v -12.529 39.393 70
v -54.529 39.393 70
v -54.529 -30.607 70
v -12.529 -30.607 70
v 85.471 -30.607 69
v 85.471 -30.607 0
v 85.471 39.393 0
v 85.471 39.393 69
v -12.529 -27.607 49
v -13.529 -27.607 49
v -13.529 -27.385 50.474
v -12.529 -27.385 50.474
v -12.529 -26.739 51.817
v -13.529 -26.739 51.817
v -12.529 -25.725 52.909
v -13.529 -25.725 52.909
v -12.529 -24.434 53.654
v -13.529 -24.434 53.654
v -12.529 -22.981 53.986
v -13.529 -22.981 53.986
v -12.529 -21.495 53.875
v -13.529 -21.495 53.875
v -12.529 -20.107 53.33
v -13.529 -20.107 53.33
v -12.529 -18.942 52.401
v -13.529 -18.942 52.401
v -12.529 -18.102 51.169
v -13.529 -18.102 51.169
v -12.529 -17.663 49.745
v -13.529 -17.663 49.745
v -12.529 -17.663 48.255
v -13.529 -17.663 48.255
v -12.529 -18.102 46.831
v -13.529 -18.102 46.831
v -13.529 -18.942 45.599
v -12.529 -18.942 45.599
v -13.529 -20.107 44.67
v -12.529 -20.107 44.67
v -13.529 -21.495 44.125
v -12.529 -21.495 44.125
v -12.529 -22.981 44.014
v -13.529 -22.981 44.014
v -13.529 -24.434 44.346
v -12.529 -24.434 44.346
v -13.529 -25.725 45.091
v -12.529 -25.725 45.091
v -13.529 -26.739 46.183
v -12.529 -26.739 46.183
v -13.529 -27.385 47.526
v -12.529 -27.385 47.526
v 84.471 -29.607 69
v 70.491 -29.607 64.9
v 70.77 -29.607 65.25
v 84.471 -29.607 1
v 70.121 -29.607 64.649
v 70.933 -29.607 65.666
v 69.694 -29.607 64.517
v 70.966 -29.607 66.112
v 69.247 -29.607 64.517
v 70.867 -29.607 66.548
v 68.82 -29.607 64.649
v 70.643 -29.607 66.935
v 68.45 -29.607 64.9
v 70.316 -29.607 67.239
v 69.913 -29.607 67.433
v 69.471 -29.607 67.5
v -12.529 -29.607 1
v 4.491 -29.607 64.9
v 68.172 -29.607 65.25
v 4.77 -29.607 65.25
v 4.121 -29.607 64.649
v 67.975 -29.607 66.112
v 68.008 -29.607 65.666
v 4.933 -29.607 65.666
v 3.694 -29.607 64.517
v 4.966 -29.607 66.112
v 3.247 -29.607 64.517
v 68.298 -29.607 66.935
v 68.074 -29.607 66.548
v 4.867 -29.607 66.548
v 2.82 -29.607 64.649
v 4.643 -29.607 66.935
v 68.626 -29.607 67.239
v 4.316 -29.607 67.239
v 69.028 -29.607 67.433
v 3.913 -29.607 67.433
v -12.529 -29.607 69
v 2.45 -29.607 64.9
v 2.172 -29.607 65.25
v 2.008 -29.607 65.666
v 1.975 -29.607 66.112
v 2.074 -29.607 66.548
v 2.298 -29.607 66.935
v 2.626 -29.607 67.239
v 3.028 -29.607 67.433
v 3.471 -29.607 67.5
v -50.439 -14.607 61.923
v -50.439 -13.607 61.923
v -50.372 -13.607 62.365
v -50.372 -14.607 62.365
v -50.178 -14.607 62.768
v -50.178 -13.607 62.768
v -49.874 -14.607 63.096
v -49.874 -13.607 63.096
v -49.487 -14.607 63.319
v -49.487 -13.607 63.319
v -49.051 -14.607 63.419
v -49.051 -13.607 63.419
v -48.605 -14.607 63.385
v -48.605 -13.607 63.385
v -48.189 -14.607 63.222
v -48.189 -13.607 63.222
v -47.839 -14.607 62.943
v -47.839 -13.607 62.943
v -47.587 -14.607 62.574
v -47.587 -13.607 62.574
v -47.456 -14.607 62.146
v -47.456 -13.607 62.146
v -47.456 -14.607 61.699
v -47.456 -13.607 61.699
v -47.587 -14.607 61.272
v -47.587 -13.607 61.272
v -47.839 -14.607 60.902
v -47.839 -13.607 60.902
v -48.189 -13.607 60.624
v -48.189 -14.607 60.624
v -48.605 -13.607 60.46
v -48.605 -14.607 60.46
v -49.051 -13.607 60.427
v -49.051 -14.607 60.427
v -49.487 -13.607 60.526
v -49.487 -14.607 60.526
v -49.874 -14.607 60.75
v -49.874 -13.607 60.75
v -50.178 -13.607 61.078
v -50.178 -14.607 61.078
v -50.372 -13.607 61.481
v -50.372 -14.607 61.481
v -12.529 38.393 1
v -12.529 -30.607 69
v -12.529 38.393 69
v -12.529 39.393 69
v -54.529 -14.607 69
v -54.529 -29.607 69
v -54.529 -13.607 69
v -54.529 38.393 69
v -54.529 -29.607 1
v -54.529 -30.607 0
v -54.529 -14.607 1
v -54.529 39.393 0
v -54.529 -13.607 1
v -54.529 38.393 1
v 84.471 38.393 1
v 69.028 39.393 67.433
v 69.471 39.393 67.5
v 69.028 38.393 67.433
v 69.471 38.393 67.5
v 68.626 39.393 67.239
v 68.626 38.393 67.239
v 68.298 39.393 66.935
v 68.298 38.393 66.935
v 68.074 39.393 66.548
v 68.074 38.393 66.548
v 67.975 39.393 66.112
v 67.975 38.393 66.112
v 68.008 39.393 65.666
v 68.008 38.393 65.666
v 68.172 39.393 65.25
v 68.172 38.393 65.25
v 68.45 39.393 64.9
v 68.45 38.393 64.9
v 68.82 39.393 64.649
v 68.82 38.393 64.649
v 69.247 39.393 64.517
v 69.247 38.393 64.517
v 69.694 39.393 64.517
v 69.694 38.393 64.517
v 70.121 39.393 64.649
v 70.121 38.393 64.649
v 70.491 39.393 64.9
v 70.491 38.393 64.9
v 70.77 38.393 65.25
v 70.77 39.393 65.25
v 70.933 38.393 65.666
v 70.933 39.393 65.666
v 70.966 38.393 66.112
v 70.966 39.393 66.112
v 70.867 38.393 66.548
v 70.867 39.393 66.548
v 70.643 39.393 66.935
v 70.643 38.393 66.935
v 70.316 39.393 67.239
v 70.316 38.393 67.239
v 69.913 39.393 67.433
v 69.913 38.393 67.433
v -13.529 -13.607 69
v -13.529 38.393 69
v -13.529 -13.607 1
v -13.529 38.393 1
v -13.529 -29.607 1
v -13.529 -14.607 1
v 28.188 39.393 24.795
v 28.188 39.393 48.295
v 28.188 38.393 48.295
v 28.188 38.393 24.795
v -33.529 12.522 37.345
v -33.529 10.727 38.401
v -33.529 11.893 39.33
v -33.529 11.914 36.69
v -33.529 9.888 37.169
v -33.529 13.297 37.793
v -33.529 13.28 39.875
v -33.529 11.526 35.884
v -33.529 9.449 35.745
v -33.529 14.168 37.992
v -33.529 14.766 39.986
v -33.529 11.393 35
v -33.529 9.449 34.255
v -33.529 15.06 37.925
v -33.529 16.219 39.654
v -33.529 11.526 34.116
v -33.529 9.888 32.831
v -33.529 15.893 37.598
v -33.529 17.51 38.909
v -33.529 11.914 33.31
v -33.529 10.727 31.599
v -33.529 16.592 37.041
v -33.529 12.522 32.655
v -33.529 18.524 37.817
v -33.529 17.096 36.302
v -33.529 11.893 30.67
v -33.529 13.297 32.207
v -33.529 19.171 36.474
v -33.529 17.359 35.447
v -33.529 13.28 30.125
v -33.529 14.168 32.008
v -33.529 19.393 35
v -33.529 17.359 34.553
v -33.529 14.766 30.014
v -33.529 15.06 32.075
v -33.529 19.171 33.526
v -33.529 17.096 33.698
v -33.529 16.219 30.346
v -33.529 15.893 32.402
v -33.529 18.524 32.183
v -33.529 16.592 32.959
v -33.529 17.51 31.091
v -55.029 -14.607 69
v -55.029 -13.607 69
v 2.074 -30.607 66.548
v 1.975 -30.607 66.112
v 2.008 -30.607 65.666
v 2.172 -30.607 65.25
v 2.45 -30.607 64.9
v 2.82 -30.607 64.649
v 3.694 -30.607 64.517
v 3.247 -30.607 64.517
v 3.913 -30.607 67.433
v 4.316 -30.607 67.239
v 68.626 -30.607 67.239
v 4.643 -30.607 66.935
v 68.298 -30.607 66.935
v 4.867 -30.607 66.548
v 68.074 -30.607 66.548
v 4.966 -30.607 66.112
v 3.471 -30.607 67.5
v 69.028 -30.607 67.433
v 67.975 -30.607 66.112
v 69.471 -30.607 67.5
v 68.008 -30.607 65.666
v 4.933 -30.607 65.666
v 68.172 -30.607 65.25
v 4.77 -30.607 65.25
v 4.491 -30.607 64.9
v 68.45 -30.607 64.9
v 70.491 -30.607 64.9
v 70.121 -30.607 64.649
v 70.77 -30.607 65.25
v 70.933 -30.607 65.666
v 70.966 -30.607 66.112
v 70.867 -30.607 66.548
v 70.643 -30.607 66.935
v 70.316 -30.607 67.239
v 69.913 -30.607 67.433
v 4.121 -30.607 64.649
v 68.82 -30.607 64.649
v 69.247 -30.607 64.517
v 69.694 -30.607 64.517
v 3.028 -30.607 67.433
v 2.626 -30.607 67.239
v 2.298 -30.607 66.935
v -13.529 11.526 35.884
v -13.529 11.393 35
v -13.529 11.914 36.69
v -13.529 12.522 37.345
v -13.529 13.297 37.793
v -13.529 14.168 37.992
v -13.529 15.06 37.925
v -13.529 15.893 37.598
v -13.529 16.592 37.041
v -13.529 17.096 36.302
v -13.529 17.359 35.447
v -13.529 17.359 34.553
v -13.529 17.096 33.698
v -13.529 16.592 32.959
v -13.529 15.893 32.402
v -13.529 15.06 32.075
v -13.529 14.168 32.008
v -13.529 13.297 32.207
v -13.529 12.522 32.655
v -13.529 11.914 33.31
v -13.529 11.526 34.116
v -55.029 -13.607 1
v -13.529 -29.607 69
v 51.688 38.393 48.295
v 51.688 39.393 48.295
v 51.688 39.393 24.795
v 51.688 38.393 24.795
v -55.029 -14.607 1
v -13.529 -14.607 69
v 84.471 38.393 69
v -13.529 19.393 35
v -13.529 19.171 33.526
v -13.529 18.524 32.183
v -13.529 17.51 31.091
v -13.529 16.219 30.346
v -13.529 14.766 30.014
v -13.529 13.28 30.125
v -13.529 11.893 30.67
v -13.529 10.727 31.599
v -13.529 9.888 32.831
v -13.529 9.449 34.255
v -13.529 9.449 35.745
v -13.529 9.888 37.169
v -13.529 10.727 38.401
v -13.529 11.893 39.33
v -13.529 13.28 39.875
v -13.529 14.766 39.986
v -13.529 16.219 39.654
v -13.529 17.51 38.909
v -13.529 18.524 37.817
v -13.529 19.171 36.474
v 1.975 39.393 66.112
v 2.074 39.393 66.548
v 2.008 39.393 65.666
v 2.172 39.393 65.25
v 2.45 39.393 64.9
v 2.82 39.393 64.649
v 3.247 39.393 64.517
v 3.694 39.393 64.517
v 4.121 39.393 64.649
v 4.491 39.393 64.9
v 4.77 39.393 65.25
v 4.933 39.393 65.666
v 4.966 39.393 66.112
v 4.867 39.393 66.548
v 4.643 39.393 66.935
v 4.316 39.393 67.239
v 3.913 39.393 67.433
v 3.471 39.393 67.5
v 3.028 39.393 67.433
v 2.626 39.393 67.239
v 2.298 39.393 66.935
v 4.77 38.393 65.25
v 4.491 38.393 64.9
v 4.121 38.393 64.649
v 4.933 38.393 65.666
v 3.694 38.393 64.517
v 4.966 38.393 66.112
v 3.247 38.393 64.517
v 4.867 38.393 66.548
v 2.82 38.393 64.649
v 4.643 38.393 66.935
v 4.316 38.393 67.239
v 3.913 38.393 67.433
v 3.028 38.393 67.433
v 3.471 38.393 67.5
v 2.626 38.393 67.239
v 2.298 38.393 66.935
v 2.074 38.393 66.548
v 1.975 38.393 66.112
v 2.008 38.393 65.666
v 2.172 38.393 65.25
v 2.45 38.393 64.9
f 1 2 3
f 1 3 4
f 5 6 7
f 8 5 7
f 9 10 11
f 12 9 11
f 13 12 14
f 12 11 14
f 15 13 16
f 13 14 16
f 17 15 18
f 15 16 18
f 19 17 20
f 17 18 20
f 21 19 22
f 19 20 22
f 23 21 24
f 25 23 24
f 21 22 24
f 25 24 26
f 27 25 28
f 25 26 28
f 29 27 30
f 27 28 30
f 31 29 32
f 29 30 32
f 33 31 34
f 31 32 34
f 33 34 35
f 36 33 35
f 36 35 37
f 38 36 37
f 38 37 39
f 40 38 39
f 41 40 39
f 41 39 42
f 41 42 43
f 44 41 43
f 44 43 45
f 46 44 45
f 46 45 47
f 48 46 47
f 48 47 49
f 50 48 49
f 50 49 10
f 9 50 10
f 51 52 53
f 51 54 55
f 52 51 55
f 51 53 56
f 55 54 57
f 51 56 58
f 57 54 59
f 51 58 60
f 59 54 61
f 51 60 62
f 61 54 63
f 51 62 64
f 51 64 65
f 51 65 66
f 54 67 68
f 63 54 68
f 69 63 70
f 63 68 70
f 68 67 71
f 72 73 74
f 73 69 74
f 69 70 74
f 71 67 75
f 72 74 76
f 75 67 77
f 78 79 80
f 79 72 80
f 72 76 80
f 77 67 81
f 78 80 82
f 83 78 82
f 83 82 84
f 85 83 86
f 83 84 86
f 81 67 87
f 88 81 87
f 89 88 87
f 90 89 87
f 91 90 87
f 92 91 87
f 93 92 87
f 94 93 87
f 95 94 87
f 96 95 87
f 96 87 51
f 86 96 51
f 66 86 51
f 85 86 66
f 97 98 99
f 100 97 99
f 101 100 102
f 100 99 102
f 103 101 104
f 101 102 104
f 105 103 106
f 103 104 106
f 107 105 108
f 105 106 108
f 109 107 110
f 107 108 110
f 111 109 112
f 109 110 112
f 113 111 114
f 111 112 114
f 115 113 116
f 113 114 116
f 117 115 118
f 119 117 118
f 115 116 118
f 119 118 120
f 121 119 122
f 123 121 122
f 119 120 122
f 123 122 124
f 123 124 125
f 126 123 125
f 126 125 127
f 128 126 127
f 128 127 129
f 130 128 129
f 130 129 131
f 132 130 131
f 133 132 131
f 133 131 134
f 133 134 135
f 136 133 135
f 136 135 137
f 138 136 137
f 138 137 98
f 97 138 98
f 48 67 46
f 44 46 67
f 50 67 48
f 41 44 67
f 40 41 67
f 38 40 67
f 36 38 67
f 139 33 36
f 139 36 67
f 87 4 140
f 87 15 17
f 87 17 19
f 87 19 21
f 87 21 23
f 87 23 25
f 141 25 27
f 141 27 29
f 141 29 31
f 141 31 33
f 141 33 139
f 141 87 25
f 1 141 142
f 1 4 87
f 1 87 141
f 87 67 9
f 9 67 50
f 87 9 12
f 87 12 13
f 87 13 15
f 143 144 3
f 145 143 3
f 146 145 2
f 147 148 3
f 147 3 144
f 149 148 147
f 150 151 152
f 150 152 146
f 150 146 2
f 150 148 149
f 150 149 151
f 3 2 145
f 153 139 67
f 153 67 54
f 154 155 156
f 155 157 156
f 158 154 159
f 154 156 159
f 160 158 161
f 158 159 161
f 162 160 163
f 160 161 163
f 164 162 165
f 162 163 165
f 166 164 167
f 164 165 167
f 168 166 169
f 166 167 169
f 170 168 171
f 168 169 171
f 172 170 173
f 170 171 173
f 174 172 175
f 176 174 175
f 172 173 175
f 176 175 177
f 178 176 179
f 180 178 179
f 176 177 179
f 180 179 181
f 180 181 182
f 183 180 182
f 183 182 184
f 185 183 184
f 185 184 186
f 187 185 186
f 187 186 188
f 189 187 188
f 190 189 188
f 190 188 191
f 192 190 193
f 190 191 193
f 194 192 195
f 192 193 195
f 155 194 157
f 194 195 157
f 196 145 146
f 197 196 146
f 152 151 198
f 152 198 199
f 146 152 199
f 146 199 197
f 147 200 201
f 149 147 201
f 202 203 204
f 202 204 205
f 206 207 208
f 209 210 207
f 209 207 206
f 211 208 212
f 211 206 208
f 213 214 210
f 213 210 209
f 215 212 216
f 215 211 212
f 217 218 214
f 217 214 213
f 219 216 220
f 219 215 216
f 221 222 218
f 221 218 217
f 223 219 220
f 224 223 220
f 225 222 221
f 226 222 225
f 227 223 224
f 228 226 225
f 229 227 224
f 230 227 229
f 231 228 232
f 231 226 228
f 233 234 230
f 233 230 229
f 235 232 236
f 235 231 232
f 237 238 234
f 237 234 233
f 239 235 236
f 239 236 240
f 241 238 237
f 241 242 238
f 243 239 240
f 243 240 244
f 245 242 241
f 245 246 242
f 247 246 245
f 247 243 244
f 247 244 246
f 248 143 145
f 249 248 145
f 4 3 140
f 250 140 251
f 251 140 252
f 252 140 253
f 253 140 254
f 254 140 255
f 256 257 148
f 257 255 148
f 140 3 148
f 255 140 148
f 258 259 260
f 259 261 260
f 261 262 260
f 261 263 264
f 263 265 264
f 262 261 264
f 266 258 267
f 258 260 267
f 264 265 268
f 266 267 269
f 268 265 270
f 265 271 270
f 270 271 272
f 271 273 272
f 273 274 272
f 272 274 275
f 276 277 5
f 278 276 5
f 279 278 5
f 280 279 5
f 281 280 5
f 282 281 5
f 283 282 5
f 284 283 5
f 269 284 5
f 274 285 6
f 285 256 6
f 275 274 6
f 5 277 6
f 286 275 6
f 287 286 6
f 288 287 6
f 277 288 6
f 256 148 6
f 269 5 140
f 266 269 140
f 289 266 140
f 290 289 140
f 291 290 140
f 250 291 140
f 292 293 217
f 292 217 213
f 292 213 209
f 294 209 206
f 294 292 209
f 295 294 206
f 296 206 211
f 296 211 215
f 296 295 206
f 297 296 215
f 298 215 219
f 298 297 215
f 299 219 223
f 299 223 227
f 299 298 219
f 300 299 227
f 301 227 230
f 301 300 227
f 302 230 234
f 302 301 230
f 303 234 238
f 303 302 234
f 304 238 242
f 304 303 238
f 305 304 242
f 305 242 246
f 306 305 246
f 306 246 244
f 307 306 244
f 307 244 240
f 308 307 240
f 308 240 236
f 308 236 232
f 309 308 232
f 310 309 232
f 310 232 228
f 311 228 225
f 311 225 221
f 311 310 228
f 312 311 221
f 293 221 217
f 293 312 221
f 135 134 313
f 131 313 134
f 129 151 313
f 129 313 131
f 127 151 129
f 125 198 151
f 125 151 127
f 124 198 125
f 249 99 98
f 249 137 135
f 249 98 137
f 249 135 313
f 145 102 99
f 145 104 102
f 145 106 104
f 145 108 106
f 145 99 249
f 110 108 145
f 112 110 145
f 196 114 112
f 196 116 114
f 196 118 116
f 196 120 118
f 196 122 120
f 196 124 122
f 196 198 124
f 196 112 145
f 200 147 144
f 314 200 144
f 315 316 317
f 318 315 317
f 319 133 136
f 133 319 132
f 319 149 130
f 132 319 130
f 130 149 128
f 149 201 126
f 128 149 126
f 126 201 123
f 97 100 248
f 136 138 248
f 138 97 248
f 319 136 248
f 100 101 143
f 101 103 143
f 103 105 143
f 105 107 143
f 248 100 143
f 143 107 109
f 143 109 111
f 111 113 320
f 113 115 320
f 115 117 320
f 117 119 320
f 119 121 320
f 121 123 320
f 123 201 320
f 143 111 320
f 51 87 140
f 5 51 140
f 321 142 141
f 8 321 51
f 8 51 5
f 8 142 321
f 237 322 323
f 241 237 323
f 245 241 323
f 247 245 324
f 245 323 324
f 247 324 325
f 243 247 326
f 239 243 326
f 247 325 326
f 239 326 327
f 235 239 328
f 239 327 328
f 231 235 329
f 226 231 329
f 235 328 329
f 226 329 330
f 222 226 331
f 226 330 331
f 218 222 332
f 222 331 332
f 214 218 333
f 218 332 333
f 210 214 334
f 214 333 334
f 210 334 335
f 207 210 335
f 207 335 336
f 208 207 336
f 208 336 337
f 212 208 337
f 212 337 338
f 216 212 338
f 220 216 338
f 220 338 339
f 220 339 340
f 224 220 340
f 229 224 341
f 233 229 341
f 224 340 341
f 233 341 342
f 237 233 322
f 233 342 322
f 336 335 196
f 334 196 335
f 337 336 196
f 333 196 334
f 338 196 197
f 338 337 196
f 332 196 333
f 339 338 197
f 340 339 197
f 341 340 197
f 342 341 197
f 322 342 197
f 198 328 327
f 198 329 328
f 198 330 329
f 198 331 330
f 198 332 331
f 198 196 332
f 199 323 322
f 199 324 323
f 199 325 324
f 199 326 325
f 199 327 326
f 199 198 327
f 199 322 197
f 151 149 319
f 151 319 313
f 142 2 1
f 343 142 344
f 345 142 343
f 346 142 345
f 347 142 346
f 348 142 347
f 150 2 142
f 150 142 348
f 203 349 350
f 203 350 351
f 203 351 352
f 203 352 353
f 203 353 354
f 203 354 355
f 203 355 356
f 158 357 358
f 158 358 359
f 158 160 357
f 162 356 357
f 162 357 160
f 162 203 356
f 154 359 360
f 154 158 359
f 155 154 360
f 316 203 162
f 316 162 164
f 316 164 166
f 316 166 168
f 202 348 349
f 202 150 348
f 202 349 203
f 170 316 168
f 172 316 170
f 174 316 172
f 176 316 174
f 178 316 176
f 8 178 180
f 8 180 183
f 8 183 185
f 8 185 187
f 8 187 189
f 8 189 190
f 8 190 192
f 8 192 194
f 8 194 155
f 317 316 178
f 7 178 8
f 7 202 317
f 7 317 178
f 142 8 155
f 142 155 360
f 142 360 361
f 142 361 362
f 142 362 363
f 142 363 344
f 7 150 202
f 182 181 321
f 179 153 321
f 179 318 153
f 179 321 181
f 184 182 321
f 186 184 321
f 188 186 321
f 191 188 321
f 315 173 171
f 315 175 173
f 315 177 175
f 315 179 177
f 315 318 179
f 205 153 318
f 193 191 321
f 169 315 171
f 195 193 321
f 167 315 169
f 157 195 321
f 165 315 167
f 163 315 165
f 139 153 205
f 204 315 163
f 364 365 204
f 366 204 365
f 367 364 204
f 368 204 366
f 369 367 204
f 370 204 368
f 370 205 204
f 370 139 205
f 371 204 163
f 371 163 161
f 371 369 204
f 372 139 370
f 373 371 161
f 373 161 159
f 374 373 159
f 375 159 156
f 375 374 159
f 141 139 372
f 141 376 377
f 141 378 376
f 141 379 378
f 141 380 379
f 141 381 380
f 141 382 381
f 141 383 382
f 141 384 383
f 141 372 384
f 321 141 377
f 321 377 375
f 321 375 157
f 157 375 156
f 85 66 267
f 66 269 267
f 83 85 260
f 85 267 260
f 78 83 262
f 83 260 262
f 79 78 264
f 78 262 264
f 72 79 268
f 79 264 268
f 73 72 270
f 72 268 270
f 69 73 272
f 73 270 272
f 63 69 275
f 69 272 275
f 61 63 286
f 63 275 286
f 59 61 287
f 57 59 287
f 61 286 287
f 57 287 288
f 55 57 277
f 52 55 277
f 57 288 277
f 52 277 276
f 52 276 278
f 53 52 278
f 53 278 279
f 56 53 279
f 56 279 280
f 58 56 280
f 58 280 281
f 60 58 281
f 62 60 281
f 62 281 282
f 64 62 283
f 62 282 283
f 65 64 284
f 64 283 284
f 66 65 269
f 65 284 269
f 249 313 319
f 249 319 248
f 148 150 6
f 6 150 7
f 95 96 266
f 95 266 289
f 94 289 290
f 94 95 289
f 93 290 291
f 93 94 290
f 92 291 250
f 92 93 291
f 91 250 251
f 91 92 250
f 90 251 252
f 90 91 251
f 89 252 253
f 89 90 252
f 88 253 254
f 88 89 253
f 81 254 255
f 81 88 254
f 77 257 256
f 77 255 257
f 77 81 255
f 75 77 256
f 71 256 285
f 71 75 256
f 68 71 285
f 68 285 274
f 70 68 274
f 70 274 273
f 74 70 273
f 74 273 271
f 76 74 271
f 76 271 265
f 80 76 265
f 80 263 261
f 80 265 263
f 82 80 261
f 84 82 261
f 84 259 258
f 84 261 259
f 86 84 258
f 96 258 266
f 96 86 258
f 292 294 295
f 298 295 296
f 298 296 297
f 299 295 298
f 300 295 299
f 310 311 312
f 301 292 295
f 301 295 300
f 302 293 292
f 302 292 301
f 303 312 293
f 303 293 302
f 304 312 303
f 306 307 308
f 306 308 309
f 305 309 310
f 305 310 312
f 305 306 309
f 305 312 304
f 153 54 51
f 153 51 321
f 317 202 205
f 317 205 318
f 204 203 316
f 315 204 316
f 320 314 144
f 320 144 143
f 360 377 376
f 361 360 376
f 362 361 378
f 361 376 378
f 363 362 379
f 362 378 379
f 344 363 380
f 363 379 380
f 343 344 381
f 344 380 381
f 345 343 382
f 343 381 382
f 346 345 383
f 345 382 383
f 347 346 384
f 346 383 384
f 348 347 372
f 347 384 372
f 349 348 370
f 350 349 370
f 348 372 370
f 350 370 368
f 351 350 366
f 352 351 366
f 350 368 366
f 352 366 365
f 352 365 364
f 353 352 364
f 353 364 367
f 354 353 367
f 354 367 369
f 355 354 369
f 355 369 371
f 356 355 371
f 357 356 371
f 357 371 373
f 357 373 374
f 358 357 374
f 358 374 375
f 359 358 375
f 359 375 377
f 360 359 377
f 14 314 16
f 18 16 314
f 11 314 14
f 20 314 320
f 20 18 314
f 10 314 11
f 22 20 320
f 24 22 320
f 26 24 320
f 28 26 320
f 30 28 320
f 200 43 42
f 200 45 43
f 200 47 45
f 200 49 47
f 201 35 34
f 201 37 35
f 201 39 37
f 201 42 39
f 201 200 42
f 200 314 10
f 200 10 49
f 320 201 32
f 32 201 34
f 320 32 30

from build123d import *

# Parameters (mm, degrees)
SKETCH_1_W          = 140
SKETCH_1_H          = 70
SKETCH_1_W_2        = 138
SKETCH_1_H_2        = 68
EXTRUDE_1_DEPTH     = 70
SKETCH_1_3_W        = 140
SKETCH_1_3_H        = 70
EXTRUDE_1_2_DEPTH   = 1
SKETCH_2_W          = 1
SKETCH_2_H          = 68
EXTRUDE_1_3_DEPTH   = 68
SKETCH_3_W          = 68
SKETCH_3_H          = 68
CUT_EXTRUDE_1_DEPTH = 25
SKETCH_4_W          = 1
SKETCH_4_H          = 70
EXTRUDE_2_DEPTH     = 42
SKETCH_5_R          = 5
SKETCH_5_R_2        = 3
EXTRUDE_3_DEPTH     = 20
SKETCH_6_W          = 68
SKETCH_6_H          = 1
EXTRUDE_4_DEPTH     = 41.5
SKETCH_8_R          = 1.5
CUT_EXTRUDE_2_DEPTH = 100
SKETCH_10_W         = 98
SKETCH_10_H         = 70
CUT_EXTRUDE_5_DEPTH = 1
SKETCH_11_R         = 1.5
CUT_EXTRUDE_6_DEPTH = 1.5
SKETCH_12_W         = 23.5
SKETCH_12_H         = 23.5
CUT_EXTRUDE_7_DEPTH = 28.5
SKETCH_13_R         = 5
CUT_EXTRUDE_8_DEPTH = 16.5


with BuildPart() as part:
    # Эскиз1 → Extrude 1 (new body)
    with BuildSketch(Plane.XY):
        with Locations((15.470629231, 4.392672242)):
            Rectangle(SKETCH_1_W, SKETCH_1_H)
        with Locations((15.470629231, 4.392672242)):
            Rectangle(SKETCH_1_W_2, SKETCH_1_H_2, mode=Mode.SUBTRACT)
    extrude(amount=EXTRUDE_1_DEPTH)

    # Эскиз1<3> → Extrude 1 2 (add)
    with BuildSketch(Plane.XY):
        with Locations((15.470629231, 4.392672242)):
            Rectangle(SKETCH_1_3_W, SKETCH_1_3_H)
    extrude(amount=EXTRUDE_1_2_DEPTH)

    # 草图2 → Extrude 1 3 (add)
    with BuildSketch(Plane.XY.offset(1)):
        with Locations((-13.029370769, 4.392672242)):
            Rectangle(SKETCH_2_W, SKETCH_2_H)
    extrude(amount=EXTRUDE_1_3_DEPTH)

    # 草图3 → 切除-拉伸1 (cut)
    with BuildSketch(Plane.ZY.offset(54.529370769)):
        with Locations((35, 4.392672242)):
            Rectangle(SKETCH_3_W, SKETCH_3_H)
    extrude(amount=-CUT_EXTRUDE_1_DEPTH, mode=Mode.SUBTRACT)

    # 草图4 → 凸台-拉伸2 (add)
    with BuildSketch(Plane.ZY.offset(54.529370769)):
        with Locations((69.5, 4.392672242)):
            Rectangle(SKETCH_4_W, SKETCH_4_H)
    extrude(amount=-EXTRUDE_2_DEPTH)

    # 草图5 → 凸台-拉伸3 (add)
    with BuildSketch(Plane.ZY.offset(13.529370769)):
        with Locations((35, 14.392672242)):
            Circle(SKETCH_5_R)
        with Locations((35, 14.392672242)):
            Circle(SKETCH_5_R_2, mode=Mode.SUBTRACT)
    extrude(amount=EXTRUDE_3_DEPTH)

    # 草图6 → 凸台-拉伸4 (add)
    with BuildSketch(Plane.ZY.offset(13.529370769)):
        with Locations((35, -14.107327758)):
            Rectangle(SKETCH_6_W, SKETCH_6_H)
    extrude(amount=EXTRUDE_4_DEPTH)

    # 草图8 → 切除-拉伸2 (cut, symmetric)
    with BuildSketch(Plane.XZ.offset(-38.392672242)):
        with Locations((3.470629231, 66)):
            Circle(SKETCH_8_R)
        with Locations((69.470629231, 66)):
            Circle(SKETCH_8_R)
    extrude(amount=CUT_EXTRUDE_2_DEPTH, both=True, mode=Mode.SUBTRACT)

    # 草图10 → 切除-拉伸5 (cut)
    with BuildSketch(Plane.XY.offset(70)):
        with Locations((36.470629231, 4.392672242)):
            Rectangle(SKETCH_10_W, SKETCH_10_H)
    extrude(amount=-CUT_EXTRUDE_5_DEPTH, mode=Mode.SUBTRACT)

    # 草图11 → 切除-拉伸6 (cut)
    with BuildSketch(Plane(origin=(0, -13.607327758, 0), x_dir=(1, 0, 0), z_dir=(0, 1, 0))):
        with Locations((-48.938859946, -61.922756224)):
            Circle(SKETCH_11_R)
    extrude(amount=-CUT_EXTRUDE_6_DEPTH, mode=Mode.SUBTRACT)

    # 草图12 → 切除-拉伸7 (cut)
    with BuildSketch(Plane(origin=(0, 39.392672242, 0), x_dir=(1, 0, 0), z_dir=(0, 1, 0))):
        with Locations((39.938426457, -36.544993355)):
            Rectangle(SKETCH_12_W, SKETCH_12_H)
    extrude(amount=-CUT_EXTRUDE_7_DEPTH, mode=Mode.SUBTRACT)

    # 草图13 → 切除-拉伸8 (cut)
    with BuildSketch(Plane.ZY.offset(13.529370769)):
        with Locations((49, -22.607327758)):
            Circle(SKETCH_13_R)
    extrude(amount=-CUT_EXTRUDE_8_DEPTH, mode=Mode.SUBTRACT)


solid = part.part
